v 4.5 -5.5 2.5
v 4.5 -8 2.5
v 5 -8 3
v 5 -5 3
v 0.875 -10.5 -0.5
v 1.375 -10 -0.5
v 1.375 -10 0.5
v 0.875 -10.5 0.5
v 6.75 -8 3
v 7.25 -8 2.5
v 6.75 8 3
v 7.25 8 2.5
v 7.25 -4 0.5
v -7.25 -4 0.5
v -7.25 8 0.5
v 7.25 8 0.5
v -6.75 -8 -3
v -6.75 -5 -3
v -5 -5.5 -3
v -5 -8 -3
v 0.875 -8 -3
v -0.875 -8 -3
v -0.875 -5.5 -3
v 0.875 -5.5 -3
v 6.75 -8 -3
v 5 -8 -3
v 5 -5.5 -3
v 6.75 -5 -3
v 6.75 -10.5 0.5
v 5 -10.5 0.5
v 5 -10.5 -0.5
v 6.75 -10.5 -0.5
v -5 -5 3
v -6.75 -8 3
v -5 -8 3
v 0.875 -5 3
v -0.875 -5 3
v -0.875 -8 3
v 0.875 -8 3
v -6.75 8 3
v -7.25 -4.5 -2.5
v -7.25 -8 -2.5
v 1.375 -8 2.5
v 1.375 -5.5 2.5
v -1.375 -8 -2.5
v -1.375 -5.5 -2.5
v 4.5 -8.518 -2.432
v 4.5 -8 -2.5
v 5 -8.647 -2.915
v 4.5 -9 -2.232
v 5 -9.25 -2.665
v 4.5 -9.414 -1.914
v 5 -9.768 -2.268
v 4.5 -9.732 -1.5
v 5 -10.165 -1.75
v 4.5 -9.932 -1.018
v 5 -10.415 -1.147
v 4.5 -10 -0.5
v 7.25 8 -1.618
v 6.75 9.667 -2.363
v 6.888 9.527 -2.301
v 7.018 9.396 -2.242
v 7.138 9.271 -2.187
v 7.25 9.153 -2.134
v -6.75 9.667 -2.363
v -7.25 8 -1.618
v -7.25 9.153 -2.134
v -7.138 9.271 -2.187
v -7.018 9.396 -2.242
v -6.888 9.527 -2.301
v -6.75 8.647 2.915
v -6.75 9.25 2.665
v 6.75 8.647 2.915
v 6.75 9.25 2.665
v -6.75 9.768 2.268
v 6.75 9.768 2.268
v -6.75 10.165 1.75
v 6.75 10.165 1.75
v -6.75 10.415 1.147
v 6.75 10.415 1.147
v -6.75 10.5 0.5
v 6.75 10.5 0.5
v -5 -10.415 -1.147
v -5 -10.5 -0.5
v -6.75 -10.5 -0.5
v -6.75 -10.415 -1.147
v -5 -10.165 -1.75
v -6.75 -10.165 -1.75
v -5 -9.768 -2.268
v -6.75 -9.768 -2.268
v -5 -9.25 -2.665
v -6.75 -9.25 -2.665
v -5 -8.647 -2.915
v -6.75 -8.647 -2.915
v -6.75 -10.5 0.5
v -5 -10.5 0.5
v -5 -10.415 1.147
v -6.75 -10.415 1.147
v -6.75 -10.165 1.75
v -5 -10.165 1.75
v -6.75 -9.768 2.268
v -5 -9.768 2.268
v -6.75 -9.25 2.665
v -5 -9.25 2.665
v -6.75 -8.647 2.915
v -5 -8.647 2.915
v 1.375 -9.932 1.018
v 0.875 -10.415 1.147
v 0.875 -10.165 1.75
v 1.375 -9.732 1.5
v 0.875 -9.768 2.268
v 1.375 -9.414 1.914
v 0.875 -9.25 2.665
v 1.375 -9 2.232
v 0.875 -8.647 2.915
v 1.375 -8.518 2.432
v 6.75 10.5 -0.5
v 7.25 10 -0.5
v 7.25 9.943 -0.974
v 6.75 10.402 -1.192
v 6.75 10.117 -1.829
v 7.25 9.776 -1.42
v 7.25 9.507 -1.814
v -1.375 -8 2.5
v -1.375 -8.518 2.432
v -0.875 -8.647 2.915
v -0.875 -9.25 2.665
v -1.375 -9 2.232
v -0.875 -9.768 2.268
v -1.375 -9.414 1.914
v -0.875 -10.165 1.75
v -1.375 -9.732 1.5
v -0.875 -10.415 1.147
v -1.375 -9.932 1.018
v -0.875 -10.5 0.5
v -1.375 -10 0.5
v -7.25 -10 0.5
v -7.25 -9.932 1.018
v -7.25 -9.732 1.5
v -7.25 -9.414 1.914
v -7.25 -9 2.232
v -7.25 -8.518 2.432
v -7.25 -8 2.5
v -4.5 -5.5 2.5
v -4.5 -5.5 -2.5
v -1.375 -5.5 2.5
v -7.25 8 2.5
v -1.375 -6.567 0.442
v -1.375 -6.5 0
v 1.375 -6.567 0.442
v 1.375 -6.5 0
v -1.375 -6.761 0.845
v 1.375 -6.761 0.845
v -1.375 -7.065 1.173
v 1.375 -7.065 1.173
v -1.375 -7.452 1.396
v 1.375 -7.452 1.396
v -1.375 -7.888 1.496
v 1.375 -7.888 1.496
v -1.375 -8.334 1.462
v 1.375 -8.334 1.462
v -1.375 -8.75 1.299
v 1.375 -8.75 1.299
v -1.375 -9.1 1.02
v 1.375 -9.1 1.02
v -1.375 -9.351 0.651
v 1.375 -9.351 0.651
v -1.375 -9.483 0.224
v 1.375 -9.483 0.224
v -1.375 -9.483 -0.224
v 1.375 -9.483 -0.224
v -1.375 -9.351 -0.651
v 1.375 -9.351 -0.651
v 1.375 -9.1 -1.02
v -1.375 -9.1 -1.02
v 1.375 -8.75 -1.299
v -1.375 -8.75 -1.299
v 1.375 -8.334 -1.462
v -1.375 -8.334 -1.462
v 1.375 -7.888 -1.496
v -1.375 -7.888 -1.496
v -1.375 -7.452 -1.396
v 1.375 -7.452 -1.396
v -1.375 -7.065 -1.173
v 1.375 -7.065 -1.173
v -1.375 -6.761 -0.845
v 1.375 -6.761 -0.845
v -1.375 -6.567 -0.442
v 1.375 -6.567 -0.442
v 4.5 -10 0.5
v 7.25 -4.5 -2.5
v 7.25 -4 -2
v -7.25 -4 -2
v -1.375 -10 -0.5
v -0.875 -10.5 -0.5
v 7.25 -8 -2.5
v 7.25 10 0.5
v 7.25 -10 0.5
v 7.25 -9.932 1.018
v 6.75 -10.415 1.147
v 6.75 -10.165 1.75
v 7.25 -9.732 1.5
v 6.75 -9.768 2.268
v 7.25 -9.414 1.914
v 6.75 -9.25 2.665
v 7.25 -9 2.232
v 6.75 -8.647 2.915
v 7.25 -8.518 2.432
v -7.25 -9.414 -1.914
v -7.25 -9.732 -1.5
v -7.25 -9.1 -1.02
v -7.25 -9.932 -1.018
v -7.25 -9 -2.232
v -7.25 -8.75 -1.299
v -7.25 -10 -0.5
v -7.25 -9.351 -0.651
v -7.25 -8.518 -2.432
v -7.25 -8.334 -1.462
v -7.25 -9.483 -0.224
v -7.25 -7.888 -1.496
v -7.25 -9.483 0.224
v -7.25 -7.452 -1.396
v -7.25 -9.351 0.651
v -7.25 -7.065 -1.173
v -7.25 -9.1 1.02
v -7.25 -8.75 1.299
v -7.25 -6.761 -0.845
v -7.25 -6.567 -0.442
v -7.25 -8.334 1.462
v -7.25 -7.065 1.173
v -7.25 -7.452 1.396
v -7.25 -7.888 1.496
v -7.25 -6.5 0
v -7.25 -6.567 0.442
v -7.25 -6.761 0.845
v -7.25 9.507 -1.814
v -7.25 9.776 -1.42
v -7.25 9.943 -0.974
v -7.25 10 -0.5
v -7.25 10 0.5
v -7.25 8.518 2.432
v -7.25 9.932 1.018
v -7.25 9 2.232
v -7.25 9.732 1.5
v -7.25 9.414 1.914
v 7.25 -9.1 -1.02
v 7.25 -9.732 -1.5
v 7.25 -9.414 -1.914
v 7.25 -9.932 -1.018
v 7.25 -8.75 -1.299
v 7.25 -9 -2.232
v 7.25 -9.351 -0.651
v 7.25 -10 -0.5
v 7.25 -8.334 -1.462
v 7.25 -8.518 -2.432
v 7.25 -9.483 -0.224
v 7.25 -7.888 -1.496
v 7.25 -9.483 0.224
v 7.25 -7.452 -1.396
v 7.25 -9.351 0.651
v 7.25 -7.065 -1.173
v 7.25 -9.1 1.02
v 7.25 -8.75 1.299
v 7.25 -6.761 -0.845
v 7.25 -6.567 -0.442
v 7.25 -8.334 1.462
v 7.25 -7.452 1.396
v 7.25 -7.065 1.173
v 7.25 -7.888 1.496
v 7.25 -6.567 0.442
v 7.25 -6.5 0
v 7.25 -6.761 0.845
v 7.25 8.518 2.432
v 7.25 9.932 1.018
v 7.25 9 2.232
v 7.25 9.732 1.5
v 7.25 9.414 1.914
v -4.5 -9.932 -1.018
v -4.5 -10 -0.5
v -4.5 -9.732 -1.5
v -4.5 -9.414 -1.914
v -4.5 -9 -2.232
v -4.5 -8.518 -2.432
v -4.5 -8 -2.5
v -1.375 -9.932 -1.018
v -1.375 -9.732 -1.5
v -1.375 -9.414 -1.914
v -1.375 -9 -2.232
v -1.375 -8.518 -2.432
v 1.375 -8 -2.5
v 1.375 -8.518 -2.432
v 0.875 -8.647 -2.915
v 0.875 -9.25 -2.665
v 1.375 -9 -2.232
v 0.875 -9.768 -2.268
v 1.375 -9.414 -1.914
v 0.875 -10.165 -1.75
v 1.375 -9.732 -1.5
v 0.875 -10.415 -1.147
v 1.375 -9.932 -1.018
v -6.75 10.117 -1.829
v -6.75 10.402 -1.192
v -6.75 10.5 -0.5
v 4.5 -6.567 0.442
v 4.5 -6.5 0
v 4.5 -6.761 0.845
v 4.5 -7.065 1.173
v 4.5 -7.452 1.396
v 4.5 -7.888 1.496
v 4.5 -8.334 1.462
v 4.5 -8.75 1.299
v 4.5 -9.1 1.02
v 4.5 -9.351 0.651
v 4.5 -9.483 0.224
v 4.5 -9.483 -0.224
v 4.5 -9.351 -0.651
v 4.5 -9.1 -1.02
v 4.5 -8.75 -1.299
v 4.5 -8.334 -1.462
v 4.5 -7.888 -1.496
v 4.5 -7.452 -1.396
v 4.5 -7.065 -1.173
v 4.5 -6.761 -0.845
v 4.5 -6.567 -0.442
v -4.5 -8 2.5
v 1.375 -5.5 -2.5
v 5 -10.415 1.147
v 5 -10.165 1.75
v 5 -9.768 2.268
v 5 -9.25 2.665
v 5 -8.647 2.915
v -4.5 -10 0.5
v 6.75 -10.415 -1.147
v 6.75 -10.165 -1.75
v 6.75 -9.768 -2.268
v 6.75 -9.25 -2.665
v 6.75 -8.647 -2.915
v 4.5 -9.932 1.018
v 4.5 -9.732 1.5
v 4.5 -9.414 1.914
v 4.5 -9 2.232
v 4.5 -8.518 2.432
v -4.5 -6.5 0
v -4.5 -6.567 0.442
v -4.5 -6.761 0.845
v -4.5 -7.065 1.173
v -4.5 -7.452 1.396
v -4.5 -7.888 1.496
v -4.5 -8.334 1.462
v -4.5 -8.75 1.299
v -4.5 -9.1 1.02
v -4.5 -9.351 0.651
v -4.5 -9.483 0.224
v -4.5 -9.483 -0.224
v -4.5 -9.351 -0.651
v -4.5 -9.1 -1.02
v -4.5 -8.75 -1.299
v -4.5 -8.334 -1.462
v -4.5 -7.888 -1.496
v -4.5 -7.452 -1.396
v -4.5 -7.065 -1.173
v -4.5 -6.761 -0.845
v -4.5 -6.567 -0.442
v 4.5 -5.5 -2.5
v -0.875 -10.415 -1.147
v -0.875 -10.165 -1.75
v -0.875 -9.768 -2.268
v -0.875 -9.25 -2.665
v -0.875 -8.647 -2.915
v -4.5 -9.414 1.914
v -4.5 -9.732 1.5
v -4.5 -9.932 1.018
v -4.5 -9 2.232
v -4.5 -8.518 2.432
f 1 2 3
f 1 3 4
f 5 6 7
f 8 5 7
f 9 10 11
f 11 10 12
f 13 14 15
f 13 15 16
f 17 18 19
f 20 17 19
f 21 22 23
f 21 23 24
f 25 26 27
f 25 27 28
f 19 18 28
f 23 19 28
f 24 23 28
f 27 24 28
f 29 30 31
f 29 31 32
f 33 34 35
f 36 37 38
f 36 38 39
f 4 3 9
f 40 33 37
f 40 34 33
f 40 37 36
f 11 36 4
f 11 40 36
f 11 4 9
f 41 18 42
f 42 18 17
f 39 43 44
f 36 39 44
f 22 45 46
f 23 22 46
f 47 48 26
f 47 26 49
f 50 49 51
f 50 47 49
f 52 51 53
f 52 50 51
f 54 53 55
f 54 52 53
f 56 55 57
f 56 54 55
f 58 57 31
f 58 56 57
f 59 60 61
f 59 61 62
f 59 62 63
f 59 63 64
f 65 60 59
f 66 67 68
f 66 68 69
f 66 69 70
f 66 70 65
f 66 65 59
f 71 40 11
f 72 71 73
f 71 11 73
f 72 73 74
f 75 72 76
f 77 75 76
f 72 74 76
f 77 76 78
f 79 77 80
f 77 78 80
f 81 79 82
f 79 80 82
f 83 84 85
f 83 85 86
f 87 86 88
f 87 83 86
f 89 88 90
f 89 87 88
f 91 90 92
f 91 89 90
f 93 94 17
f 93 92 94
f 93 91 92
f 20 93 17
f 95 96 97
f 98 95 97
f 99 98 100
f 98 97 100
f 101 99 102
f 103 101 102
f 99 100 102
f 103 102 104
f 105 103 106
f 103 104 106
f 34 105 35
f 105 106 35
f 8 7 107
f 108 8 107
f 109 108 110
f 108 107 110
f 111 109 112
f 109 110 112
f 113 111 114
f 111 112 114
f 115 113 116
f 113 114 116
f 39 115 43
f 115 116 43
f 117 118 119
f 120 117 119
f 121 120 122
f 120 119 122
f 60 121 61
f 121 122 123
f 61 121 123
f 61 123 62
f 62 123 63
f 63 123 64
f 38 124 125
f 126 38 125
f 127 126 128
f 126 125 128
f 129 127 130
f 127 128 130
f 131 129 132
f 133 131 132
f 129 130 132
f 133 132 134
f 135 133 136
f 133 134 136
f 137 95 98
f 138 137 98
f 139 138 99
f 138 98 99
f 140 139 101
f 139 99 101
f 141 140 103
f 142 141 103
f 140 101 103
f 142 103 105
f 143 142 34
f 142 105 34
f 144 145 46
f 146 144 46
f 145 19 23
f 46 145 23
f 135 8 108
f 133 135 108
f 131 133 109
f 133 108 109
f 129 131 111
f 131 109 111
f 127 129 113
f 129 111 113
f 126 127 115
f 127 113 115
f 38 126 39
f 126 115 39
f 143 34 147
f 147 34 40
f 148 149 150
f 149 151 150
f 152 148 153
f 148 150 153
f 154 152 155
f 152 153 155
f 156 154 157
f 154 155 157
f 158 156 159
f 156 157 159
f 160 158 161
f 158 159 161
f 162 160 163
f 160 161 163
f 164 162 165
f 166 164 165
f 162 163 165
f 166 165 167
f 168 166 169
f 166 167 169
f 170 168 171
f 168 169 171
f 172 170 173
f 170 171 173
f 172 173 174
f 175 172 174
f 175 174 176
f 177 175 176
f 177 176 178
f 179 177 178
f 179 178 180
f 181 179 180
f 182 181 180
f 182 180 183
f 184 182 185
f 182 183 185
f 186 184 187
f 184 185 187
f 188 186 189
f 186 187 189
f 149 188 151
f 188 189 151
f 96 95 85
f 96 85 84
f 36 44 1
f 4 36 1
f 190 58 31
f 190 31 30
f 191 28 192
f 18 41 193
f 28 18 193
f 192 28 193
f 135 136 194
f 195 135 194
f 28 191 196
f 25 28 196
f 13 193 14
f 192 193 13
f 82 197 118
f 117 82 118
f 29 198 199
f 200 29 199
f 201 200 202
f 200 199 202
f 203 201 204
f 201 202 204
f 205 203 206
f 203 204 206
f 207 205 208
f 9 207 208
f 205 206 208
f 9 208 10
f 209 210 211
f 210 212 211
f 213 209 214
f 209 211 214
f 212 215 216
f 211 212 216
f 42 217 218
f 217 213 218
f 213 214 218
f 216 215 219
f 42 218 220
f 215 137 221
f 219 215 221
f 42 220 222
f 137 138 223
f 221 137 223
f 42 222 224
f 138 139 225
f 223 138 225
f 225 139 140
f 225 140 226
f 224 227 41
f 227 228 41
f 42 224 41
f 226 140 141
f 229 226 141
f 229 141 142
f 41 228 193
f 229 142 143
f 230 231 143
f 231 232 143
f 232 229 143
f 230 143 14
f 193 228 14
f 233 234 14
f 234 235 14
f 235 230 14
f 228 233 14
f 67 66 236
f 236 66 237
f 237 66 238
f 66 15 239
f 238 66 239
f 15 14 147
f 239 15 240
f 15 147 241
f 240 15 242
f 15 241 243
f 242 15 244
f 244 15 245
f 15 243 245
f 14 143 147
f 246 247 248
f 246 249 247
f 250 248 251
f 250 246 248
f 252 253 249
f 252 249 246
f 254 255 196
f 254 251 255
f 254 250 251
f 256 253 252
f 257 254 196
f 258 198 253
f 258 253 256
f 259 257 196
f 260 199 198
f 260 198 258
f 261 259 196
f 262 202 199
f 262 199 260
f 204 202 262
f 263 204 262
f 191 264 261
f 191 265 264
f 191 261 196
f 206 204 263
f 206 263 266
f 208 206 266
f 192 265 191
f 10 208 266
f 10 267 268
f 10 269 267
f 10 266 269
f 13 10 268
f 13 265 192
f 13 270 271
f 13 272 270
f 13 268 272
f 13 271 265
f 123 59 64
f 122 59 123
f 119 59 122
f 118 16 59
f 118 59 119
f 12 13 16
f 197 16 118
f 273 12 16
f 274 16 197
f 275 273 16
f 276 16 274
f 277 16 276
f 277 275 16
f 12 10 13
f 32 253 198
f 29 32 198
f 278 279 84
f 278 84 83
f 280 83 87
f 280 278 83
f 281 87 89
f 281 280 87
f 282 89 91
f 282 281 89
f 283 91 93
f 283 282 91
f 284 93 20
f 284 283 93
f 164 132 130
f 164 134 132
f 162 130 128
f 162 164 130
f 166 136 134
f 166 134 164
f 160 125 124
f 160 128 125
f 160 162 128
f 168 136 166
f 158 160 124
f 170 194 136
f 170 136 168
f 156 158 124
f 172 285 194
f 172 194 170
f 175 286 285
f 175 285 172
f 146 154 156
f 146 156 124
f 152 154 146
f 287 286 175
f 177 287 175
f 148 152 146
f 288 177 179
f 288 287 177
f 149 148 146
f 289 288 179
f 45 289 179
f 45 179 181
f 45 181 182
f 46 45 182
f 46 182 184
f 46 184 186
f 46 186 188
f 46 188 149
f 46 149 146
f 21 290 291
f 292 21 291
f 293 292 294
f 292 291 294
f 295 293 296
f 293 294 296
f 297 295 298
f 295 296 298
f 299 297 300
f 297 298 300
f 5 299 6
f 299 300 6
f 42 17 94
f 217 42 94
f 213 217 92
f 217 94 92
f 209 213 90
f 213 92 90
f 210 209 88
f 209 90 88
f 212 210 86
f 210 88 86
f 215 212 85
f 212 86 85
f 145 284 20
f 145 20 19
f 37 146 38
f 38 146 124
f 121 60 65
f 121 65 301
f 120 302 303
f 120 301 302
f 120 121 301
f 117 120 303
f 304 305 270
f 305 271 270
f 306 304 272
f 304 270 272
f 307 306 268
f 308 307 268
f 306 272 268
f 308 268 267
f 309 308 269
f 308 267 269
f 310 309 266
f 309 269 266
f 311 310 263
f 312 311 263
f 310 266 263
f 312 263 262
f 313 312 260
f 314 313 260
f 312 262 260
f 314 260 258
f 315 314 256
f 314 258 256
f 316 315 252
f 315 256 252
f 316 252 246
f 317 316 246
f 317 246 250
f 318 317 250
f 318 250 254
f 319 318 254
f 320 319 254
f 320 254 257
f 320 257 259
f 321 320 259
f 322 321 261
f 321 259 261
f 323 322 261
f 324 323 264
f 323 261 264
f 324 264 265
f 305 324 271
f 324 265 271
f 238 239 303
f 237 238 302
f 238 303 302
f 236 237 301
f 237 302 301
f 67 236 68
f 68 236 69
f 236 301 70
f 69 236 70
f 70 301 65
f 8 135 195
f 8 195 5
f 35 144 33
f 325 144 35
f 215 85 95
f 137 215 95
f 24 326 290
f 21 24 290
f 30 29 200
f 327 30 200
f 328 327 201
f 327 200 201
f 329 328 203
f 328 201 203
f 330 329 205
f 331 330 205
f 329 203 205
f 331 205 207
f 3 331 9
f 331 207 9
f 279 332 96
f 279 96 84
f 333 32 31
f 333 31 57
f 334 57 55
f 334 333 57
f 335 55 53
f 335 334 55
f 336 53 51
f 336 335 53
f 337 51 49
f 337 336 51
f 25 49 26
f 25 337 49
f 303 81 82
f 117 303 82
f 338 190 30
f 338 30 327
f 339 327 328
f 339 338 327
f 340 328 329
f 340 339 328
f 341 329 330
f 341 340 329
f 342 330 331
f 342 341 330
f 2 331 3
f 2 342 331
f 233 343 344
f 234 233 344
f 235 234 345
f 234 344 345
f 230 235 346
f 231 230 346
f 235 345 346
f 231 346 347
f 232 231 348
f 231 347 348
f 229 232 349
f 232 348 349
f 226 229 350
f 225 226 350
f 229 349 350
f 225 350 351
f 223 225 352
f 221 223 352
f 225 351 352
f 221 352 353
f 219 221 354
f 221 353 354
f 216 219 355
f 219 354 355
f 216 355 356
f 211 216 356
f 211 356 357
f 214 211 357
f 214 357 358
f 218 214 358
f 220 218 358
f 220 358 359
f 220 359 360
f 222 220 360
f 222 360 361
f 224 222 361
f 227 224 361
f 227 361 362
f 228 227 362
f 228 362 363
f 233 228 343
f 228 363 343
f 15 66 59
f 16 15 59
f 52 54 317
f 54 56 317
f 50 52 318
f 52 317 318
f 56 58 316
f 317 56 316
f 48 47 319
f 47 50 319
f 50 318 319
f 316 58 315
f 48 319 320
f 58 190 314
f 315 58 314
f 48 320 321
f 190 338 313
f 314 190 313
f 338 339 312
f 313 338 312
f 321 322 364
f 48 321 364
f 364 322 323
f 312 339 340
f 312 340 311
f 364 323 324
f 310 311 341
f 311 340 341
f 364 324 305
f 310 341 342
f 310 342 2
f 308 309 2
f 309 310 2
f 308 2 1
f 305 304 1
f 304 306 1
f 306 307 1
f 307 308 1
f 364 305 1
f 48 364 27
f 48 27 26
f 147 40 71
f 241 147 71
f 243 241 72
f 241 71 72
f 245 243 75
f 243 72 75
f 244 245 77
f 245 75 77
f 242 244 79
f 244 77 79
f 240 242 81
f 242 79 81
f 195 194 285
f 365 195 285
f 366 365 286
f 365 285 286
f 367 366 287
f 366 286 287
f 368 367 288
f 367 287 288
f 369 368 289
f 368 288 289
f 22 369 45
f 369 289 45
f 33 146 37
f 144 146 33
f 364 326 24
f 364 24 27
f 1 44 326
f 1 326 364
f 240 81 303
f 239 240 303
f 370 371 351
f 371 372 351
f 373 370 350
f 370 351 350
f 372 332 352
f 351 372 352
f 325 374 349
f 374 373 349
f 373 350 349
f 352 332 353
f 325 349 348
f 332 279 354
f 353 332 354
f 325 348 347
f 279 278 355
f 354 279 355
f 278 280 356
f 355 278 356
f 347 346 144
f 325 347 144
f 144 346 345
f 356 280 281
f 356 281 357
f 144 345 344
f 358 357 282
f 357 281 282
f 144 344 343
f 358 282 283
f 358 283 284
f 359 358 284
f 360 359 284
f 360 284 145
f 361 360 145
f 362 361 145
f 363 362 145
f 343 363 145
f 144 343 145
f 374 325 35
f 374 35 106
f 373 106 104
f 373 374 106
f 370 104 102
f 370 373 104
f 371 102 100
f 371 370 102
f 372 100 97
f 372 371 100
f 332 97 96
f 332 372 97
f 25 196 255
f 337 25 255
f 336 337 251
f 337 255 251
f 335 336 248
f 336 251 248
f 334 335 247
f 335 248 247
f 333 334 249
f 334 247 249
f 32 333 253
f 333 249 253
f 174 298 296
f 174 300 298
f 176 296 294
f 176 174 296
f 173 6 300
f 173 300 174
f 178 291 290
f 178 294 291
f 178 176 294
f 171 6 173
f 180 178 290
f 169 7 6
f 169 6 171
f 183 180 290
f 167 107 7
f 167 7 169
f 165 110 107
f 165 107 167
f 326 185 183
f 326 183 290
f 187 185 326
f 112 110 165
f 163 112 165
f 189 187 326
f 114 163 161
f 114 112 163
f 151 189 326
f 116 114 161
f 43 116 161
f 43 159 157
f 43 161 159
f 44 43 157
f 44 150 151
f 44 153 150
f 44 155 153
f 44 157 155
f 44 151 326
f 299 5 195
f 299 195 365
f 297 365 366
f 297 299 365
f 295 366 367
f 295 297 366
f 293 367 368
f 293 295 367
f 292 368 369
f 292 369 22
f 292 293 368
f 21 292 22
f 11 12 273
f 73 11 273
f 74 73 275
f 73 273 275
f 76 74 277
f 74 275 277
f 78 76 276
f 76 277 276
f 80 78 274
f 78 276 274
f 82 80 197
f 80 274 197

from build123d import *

# Parameters (mm, degrees)
F0_W        = 14.5
F0_H        = 21
F1_DEPTH    = 3
F2_R        = 1.5
F3_DEPTH    = 25
F4_R        = 2.5
F5_W        = 3.125
F5_H        = 5
F6_DEPTH    = 12.5
F7_W        = 14.5
F7_H        = 12
F8_DEPTH    = 3.5
F9_T1_DEPTH = 19.6433659759
F9_T3_DEPTH = 23.5630770458
F10_SIZE    = 0.5


# Not quite as in the source:
# - a fillet or chamfer that OpenCascade refuses, or shapes differently, is made with other operations: its cross-section is extruded or revolved along the edge and cut away or added


with BuildPart() as f1:
    # F0 (on Top) → F1 (new body, symmetric)
    with BuildSketch(Plane.XY):
        Rectangle(F0_W, F0_H)
    extrude(amount=F1_DEPTH, both=True)

    # F2 (on Right) → F3 (cut, symmetric)
    with BuildSketch(Plane.YZ):
        with Locations((-8, 0)):
            Circle(F2_R)
    extrude(amount=F3_DEPTH, both=True, mode=Mode.SUBTRACT)

    # F4
    f4_edges = [f1.edges().sort_by_distance(p)[0] for p in [
        (0, -10.5, 3),
        (0, -10.5, -3),
        (0, 10.5, 3),
        (0, 10.5, -3),
    ]]
    fillet(f4_edges, radius=F4_R)

    # F5 (on Top) → F6 (cut, symmetric)
    with BuildSketch(Plane.XY):
        with Locations((-2.9375, -8)):
            Rectangle(F5_W, F5_H)
        with Locations((2.9375, -8)):
            Rectangle(F5_W, F5_H)
    extrude(amount=F6_DEPTH, both=True, mode=Mode.SUBTRACT)

    # F7 (on face) → F8 (cut)
    with BuildSketch(Plane(origin=(0, 0, -3), x_dir=(1, 0, 0), z_dir=(0, 0, -1))):
        with Locations((0, -2)):
            Rectangle(F7_W, F7_H)
    extrude(amount=-F8_DEPTH, mode=Mode.SUBTRACT)

    # F9: chamfer of 1 on 2 edges, made by hand

    # F9_s2 → F9_t1 (cut)
    with BuildSketch(Plane.YZ.offset(-9.821682988)):
        Polygon((-5, -3), (-4, -2), (-4, -3), align=None)
    extrude(amount=F9_T1_DEPTH, mode=Mode.SUBTRACT)

    # F9_s4 → F9_t3 (cut)
    with BuildSketch(Plane.YZ.offset(-11.7815385229)):
        with BuildLine():
            Line((9.6666666667, -2.3633899812), (8, -1.6180339887))
            Line((8, -1.6180339887), (8, -3))
            ThreePointArc((8, -3), (8.906095825, -2.8300193896), (9.6666666667, -2.3633899812))
        make_face()
    extrude(amount=F9_T3_DEPTH, mode=Mode.SUBTRACT)

    # F10
    f10_edges = [f1.edges().sort_by_distance(p)[0] for p in [
        (-7.25, 0, 3),
        (-4.5, -6.75, 3),
        (-1.375, -6.75, 3),
        (1.375, -6.75, 3),
        (4.5, -6.75, 3),
        (7.25, 0, 3),
        (2.9375, -5.5, 3),
        (-2.9375, -5.5, 3),
        (-7.25, 10.5, 0),
        (7.25, 10.5, 0),
        (-7.25, 9.767767, 2.267767),
        (-7.25, -9.767767, 2.267767),
        (-7.25, -10.5, 0),
        (-7.25, -9.767767, -2.267767),
        (-7.25, -6.5, -3),
        (-7.25, 10.282177, -1.520621),
        (7.25, 10.282177, -1.520621),
        (7.25, 9.767767, 2.267767),
        (7.25, -9.767767, -2.267767),
        (7.25, -10.5, 0),
        (7.25, -9.767767, 2.267767),
        (7.25, -6.5, -3),
        (-4.5, -9.767767, 2.267767),
        (-4.5, -10.5, 0),
        (-4.5, -9.767767, -2.267767),
        (4.5, -6.75, -3),
        (1.375, -6.75, -3),
        (-1.375, -6.75, -3),
        (-4.5, -6.75, -3),
        (4.5, -9.767767, -2.267767),
        (4.5, -10.5, 0),
        (4.5, -9.767767, 2.267767),
        (1.375, -9.767767, 2.267767),
        (1.375, -10.5, 0),
        (1.375, -9.767767, -2.267767),
        (-1.375, -9.767767, 2.267767),
        (-1.375, -10.5, 0),
        (-1.375, -9.767767, -2.267767),
    ]]
    chamfer(f10_edges, length=F10_SIZE)


solid = f1.part
